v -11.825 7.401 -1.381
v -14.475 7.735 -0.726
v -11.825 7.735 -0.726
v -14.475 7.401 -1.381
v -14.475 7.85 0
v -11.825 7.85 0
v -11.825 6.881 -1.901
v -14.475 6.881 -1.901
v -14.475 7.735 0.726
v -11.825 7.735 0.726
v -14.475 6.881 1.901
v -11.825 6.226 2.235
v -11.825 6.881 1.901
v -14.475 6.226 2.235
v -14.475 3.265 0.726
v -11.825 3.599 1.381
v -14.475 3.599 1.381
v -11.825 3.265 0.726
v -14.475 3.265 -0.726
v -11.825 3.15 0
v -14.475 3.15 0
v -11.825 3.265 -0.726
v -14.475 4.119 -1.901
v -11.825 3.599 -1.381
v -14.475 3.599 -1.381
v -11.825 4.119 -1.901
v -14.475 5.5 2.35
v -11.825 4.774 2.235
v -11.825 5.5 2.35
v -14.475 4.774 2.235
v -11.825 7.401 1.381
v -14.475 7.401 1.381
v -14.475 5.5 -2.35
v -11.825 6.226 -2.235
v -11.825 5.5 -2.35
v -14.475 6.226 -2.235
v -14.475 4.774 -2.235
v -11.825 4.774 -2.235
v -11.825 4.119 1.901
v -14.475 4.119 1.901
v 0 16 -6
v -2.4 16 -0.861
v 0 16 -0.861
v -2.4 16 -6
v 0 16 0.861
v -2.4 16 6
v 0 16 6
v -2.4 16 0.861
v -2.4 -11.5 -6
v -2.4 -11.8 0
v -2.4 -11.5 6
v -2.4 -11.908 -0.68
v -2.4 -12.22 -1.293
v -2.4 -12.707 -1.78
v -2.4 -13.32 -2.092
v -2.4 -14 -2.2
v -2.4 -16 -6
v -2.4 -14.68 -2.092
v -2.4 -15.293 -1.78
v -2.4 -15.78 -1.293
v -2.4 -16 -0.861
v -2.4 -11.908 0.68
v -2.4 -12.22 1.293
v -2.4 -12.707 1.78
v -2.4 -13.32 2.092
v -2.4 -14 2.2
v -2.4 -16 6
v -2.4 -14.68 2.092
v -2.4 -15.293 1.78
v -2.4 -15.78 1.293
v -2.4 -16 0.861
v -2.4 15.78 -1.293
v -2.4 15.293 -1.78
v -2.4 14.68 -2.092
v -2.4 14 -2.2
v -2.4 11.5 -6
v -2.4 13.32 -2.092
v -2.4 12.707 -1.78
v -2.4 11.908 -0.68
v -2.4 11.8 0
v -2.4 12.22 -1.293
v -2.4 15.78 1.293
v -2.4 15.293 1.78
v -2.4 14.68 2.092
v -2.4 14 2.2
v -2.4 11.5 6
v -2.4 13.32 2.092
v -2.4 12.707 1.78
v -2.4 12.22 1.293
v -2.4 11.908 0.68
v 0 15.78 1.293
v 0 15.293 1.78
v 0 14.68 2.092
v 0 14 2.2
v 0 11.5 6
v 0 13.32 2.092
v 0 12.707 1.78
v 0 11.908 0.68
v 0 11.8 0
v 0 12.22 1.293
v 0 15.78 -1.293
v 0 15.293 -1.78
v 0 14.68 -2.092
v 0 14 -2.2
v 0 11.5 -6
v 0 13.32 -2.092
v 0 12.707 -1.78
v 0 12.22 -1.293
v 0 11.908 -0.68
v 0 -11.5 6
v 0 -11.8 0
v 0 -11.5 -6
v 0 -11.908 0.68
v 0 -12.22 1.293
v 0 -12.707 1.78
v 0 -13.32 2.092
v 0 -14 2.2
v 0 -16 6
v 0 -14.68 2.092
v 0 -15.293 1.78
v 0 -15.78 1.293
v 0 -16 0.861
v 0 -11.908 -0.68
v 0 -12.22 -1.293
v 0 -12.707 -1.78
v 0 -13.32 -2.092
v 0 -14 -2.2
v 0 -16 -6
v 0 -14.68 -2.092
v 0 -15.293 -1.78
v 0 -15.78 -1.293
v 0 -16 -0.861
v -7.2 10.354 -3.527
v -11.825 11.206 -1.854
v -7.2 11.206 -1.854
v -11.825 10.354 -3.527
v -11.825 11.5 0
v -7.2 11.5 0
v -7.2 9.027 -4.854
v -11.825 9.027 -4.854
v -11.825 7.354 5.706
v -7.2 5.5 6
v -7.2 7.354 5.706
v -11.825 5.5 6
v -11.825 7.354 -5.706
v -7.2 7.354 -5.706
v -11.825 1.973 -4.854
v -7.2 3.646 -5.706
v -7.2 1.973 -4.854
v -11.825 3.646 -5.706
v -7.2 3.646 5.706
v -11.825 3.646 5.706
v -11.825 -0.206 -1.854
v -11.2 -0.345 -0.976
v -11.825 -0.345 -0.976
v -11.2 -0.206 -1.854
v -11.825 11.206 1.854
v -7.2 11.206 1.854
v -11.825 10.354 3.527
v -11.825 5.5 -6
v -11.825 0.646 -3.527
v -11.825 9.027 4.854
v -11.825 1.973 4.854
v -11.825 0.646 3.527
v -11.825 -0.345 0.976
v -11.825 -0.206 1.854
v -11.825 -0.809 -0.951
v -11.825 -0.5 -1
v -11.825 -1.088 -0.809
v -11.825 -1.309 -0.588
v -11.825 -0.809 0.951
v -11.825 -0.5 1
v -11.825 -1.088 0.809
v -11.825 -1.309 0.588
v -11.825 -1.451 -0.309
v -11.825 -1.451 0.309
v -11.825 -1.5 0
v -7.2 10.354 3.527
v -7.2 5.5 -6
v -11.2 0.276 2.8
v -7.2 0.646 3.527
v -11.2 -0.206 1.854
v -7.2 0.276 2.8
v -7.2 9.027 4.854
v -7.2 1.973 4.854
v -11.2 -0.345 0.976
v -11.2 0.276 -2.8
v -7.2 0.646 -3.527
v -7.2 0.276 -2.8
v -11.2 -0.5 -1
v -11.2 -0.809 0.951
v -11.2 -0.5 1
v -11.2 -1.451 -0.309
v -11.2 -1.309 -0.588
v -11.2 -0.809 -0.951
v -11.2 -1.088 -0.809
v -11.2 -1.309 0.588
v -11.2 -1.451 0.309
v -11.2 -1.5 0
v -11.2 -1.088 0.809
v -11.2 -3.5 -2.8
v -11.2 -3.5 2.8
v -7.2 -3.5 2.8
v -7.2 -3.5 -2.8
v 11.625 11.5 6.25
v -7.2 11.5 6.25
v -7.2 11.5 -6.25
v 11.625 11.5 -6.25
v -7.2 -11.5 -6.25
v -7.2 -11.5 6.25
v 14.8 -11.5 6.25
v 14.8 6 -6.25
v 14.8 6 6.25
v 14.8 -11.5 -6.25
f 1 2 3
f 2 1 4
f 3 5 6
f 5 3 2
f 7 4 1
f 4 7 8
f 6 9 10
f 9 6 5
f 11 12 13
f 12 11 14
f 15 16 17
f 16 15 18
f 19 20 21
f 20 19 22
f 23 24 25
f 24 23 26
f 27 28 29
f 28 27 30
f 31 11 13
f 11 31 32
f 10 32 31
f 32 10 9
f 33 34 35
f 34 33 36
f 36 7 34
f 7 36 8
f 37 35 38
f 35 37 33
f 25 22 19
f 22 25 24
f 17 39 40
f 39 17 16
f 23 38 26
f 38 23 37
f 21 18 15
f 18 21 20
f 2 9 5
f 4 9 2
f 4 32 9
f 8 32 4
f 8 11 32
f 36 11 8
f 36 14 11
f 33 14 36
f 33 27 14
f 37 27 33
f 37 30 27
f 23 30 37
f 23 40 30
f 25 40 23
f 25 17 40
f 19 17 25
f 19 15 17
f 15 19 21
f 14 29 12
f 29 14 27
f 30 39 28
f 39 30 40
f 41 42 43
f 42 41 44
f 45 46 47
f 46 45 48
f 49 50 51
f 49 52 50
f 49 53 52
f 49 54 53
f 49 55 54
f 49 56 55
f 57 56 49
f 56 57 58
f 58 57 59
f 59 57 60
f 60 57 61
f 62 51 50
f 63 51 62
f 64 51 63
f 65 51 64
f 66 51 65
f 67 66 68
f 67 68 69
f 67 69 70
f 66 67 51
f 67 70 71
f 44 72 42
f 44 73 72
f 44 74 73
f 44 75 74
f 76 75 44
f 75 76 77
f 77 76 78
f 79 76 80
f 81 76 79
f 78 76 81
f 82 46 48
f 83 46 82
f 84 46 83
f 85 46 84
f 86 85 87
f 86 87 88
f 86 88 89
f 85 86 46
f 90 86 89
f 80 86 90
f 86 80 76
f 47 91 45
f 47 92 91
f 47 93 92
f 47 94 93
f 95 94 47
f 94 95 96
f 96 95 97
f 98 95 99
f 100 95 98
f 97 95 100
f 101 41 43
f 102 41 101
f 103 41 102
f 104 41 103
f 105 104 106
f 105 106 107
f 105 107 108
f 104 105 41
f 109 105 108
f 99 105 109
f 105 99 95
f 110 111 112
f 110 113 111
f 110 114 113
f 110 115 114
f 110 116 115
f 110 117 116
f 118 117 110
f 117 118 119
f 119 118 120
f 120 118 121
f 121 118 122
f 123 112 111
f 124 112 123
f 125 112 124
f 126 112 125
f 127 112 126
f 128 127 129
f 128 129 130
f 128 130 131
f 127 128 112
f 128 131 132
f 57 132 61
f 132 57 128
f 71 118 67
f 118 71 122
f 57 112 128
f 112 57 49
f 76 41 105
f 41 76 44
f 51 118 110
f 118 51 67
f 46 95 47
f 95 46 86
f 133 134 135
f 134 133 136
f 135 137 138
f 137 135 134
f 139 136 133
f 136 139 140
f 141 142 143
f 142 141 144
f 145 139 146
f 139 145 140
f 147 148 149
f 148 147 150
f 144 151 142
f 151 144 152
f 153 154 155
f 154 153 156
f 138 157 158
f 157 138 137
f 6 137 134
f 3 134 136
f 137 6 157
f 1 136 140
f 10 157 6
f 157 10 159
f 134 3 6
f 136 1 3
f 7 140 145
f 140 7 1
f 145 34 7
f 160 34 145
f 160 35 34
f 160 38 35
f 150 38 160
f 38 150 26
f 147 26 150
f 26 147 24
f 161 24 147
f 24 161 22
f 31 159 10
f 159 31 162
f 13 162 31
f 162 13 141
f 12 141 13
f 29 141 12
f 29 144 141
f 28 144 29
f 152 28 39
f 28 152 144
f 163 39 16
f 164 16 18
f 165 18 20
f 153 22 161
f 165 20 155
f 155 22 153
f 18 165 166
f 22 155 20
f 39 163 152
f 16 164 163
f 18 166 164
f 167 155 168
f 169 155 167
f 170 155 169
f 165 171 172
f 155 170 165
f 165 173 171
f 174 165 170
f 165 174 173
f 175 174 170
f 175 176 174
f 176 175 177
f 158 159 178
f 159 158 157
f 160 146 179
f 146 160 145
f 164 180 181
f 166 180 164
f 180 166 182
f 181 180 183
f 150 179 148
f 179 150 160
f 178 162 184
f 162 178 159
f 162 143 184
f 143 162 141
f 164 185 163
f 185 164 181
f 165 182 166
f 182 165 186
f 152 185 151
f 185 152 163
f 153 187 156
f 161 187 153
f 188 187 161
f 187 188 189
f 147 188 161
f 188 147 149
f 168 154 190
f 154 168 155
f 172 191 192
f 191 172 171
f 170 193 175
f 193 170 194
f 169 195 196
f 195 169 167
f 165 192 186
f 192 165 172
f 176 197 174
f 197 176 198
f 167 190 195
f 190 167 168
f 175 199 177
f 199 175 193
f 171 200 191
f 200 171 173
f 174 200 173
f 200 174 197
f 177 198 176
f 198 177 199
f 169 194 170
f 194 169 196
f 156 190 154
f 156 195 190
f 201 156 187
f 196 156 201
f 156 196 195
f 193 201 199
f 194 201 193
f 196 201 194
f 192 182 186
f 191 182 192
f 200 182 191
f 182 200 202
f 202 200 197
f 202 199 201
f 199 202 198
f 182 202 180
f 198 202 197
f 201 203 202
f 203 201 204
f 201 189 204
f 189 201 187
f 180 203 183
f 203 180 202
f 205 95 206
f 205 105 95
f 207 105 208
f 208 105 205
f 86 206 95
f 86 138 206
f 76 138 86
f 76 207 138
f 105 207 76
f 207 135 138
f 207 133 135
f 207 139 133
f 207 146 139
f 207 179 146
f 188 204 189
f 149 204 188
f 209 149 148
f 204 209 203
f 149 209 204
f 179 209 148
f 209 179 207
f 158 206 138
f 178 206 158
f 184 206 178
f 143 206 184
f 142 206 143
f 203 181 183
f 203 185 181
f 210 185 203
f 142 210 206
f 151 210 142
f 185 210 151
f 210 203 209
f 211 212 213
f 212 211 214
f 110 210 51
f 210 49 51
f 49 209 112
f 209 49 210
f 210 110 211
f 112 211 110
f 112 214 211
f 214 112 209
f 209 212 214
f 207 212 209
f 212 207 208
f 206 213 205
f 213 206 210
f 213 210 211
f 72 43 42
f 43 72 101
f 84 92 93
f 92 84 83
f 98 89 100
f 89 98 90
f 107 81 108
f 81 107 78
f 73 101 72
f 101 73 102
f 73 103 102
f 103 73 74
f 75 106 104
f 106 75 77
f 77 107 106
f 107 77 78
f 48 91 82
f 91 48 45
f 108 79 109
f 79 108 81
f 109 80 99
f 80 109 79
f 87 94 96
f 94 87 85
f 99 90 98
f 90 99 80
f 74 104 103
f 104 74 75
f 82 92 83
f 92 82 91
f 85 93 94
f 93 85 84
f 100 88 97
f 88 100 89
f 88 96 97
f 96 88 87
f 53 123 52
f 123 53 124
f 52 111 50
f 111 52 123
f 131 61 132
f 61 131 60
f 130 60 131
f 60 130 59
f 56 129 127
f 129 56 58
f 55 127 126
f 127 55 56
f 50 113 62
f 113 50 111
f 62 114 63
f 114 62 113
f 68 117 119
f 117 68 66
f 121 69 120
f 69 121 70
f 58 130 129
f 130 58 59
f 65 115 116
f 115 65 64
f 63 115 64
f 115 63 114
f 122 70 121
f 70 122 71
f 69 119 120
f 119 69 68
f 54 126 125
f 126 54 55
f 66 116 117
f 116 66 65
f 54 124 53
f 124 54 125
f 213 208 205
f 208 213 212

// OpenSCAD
/* 

9G Servo in OpenSCAD by TheCase on Thingiverse: https://www.thingiverse.com/thing:29734

This thing was started by Thingiverse user TheCase, and is licensed under cc.

The origin for the received object is the center of the main block, 
and there was no easy way to determine where to mount the servo and 
install a servo horn.


Usage: 

    use <ScadApotheka/9g_servo.scad>




*/

* 9g_motor();

function 9g_motor() = 
    let(
        tran_sprkt = [5.5,0,3.65],
        sprkt_h = 29.25,
        tran_sprkt_top = [0, 0, sprkt_h/2],
        tran_mnt = [0,0,5],
        thick_mnt = 2.4,
        size_mnt = [32,12,thick_mnt],
        size_body = [23,12.5,22],
        offset_sprkt_origin = -(tran_sprkt + tran_sprkt_top),
        offset_mnt = -[0, 0, thick_mnt/2 ],
        tran_mnt_cl =  offset_sprkt_origin + tran_mnt - [0, 0, thick_mnt/2 ]
    ) 
    
[
    [
        ["offset_for_sprocket_origin", offset_sprkt_origin],
        ["mount_cl_bottom_translation", tran_mnt_cl]
    ],
    [
        ["sprocket_translation", tran_sprkt],
        ["sprocket_height", sprkt_h],
        ["mounting_translation", tran_mnt],
        ["mounting_size", size_mnt],
        ["body_size", size_body],
    ]   
];


* 9g_motor_sprocket_at_origin();

module 9g_motor_sprocket_at_origin(alpha=1, highlight=false) {
    offset_for_sprocket_orgin = 9g_motor()[0][0][1];
    tran_mnt_cl = 9g_motor()[0][1][1];
    //color("black") translate(tran_mnt_cl) sphere(1);
    if (highlight) {
        # translate(offset_for_sprocket_orgin)  9g_motor();  
    } else {
        color("green", alpha=alpha)  translate(offset_for_sprocket_orgin)  9g_motor(); 
    } 
}




module 9g_motor_centered_for_mounting() {
    t_mnt = 9g_motor()[1][2][1] ;
    s_mnt = 9g_motor()[1][3][1];
    rotate([-90,0,90]) 
        translate(-t_mnt+[0,0,s_mnt.z/2] ) 9g_motor();  
}

9g_motor_centered_for_mounting();

module 9g_motor(alpha=1){
    body_color = "SteelBlue";
    sprocket_color = "white";
    t_sprkt = 9g_motor()[1][0][1];
    h_sprkt = 9g_motor()[1][1][1];
    t_mnt = 9g_motor()[1][2][1];
    s_mnt = 9g_motor()[1][3][1];
    s_body = 9g_motor()[1][4][1];
    
	difference(){			
		union(){
			color(sprocket_color) translate(t_sprkt) cylinder(r=2.35, h=h_sprkt, $fn=20, center=true);
			color(body_color, alpha=alpha) translate(t_mnt) cube(s_mnt, center=true);
			color(body_color, alpha=alpha) translate([5.5,0,2.75]) cylinder(r=6, h=25.75, $fn=20, center=true);
			color(body_color, alpha=alpha) translate([-.5,0,2.75]) cylinder(r=1, h=25.75, $fn=20, center=true);
			color(body_color, alpha=alpha) translate([-1,0,2.75]) cube([5,5.6,24.5], center=true);		
            color(body_color, alpha=alpha) cube(s_body, center=true);    
		}
		translate([10,0,-11]) rotate([0,-30,0]) cube([8,13,4], center=true);
		for ( hole = [14,-14] ){
			translate([hole,0,5]) cylinder(r=2.2, h=4, $fn=20, center=true);
		}	
	}
}
